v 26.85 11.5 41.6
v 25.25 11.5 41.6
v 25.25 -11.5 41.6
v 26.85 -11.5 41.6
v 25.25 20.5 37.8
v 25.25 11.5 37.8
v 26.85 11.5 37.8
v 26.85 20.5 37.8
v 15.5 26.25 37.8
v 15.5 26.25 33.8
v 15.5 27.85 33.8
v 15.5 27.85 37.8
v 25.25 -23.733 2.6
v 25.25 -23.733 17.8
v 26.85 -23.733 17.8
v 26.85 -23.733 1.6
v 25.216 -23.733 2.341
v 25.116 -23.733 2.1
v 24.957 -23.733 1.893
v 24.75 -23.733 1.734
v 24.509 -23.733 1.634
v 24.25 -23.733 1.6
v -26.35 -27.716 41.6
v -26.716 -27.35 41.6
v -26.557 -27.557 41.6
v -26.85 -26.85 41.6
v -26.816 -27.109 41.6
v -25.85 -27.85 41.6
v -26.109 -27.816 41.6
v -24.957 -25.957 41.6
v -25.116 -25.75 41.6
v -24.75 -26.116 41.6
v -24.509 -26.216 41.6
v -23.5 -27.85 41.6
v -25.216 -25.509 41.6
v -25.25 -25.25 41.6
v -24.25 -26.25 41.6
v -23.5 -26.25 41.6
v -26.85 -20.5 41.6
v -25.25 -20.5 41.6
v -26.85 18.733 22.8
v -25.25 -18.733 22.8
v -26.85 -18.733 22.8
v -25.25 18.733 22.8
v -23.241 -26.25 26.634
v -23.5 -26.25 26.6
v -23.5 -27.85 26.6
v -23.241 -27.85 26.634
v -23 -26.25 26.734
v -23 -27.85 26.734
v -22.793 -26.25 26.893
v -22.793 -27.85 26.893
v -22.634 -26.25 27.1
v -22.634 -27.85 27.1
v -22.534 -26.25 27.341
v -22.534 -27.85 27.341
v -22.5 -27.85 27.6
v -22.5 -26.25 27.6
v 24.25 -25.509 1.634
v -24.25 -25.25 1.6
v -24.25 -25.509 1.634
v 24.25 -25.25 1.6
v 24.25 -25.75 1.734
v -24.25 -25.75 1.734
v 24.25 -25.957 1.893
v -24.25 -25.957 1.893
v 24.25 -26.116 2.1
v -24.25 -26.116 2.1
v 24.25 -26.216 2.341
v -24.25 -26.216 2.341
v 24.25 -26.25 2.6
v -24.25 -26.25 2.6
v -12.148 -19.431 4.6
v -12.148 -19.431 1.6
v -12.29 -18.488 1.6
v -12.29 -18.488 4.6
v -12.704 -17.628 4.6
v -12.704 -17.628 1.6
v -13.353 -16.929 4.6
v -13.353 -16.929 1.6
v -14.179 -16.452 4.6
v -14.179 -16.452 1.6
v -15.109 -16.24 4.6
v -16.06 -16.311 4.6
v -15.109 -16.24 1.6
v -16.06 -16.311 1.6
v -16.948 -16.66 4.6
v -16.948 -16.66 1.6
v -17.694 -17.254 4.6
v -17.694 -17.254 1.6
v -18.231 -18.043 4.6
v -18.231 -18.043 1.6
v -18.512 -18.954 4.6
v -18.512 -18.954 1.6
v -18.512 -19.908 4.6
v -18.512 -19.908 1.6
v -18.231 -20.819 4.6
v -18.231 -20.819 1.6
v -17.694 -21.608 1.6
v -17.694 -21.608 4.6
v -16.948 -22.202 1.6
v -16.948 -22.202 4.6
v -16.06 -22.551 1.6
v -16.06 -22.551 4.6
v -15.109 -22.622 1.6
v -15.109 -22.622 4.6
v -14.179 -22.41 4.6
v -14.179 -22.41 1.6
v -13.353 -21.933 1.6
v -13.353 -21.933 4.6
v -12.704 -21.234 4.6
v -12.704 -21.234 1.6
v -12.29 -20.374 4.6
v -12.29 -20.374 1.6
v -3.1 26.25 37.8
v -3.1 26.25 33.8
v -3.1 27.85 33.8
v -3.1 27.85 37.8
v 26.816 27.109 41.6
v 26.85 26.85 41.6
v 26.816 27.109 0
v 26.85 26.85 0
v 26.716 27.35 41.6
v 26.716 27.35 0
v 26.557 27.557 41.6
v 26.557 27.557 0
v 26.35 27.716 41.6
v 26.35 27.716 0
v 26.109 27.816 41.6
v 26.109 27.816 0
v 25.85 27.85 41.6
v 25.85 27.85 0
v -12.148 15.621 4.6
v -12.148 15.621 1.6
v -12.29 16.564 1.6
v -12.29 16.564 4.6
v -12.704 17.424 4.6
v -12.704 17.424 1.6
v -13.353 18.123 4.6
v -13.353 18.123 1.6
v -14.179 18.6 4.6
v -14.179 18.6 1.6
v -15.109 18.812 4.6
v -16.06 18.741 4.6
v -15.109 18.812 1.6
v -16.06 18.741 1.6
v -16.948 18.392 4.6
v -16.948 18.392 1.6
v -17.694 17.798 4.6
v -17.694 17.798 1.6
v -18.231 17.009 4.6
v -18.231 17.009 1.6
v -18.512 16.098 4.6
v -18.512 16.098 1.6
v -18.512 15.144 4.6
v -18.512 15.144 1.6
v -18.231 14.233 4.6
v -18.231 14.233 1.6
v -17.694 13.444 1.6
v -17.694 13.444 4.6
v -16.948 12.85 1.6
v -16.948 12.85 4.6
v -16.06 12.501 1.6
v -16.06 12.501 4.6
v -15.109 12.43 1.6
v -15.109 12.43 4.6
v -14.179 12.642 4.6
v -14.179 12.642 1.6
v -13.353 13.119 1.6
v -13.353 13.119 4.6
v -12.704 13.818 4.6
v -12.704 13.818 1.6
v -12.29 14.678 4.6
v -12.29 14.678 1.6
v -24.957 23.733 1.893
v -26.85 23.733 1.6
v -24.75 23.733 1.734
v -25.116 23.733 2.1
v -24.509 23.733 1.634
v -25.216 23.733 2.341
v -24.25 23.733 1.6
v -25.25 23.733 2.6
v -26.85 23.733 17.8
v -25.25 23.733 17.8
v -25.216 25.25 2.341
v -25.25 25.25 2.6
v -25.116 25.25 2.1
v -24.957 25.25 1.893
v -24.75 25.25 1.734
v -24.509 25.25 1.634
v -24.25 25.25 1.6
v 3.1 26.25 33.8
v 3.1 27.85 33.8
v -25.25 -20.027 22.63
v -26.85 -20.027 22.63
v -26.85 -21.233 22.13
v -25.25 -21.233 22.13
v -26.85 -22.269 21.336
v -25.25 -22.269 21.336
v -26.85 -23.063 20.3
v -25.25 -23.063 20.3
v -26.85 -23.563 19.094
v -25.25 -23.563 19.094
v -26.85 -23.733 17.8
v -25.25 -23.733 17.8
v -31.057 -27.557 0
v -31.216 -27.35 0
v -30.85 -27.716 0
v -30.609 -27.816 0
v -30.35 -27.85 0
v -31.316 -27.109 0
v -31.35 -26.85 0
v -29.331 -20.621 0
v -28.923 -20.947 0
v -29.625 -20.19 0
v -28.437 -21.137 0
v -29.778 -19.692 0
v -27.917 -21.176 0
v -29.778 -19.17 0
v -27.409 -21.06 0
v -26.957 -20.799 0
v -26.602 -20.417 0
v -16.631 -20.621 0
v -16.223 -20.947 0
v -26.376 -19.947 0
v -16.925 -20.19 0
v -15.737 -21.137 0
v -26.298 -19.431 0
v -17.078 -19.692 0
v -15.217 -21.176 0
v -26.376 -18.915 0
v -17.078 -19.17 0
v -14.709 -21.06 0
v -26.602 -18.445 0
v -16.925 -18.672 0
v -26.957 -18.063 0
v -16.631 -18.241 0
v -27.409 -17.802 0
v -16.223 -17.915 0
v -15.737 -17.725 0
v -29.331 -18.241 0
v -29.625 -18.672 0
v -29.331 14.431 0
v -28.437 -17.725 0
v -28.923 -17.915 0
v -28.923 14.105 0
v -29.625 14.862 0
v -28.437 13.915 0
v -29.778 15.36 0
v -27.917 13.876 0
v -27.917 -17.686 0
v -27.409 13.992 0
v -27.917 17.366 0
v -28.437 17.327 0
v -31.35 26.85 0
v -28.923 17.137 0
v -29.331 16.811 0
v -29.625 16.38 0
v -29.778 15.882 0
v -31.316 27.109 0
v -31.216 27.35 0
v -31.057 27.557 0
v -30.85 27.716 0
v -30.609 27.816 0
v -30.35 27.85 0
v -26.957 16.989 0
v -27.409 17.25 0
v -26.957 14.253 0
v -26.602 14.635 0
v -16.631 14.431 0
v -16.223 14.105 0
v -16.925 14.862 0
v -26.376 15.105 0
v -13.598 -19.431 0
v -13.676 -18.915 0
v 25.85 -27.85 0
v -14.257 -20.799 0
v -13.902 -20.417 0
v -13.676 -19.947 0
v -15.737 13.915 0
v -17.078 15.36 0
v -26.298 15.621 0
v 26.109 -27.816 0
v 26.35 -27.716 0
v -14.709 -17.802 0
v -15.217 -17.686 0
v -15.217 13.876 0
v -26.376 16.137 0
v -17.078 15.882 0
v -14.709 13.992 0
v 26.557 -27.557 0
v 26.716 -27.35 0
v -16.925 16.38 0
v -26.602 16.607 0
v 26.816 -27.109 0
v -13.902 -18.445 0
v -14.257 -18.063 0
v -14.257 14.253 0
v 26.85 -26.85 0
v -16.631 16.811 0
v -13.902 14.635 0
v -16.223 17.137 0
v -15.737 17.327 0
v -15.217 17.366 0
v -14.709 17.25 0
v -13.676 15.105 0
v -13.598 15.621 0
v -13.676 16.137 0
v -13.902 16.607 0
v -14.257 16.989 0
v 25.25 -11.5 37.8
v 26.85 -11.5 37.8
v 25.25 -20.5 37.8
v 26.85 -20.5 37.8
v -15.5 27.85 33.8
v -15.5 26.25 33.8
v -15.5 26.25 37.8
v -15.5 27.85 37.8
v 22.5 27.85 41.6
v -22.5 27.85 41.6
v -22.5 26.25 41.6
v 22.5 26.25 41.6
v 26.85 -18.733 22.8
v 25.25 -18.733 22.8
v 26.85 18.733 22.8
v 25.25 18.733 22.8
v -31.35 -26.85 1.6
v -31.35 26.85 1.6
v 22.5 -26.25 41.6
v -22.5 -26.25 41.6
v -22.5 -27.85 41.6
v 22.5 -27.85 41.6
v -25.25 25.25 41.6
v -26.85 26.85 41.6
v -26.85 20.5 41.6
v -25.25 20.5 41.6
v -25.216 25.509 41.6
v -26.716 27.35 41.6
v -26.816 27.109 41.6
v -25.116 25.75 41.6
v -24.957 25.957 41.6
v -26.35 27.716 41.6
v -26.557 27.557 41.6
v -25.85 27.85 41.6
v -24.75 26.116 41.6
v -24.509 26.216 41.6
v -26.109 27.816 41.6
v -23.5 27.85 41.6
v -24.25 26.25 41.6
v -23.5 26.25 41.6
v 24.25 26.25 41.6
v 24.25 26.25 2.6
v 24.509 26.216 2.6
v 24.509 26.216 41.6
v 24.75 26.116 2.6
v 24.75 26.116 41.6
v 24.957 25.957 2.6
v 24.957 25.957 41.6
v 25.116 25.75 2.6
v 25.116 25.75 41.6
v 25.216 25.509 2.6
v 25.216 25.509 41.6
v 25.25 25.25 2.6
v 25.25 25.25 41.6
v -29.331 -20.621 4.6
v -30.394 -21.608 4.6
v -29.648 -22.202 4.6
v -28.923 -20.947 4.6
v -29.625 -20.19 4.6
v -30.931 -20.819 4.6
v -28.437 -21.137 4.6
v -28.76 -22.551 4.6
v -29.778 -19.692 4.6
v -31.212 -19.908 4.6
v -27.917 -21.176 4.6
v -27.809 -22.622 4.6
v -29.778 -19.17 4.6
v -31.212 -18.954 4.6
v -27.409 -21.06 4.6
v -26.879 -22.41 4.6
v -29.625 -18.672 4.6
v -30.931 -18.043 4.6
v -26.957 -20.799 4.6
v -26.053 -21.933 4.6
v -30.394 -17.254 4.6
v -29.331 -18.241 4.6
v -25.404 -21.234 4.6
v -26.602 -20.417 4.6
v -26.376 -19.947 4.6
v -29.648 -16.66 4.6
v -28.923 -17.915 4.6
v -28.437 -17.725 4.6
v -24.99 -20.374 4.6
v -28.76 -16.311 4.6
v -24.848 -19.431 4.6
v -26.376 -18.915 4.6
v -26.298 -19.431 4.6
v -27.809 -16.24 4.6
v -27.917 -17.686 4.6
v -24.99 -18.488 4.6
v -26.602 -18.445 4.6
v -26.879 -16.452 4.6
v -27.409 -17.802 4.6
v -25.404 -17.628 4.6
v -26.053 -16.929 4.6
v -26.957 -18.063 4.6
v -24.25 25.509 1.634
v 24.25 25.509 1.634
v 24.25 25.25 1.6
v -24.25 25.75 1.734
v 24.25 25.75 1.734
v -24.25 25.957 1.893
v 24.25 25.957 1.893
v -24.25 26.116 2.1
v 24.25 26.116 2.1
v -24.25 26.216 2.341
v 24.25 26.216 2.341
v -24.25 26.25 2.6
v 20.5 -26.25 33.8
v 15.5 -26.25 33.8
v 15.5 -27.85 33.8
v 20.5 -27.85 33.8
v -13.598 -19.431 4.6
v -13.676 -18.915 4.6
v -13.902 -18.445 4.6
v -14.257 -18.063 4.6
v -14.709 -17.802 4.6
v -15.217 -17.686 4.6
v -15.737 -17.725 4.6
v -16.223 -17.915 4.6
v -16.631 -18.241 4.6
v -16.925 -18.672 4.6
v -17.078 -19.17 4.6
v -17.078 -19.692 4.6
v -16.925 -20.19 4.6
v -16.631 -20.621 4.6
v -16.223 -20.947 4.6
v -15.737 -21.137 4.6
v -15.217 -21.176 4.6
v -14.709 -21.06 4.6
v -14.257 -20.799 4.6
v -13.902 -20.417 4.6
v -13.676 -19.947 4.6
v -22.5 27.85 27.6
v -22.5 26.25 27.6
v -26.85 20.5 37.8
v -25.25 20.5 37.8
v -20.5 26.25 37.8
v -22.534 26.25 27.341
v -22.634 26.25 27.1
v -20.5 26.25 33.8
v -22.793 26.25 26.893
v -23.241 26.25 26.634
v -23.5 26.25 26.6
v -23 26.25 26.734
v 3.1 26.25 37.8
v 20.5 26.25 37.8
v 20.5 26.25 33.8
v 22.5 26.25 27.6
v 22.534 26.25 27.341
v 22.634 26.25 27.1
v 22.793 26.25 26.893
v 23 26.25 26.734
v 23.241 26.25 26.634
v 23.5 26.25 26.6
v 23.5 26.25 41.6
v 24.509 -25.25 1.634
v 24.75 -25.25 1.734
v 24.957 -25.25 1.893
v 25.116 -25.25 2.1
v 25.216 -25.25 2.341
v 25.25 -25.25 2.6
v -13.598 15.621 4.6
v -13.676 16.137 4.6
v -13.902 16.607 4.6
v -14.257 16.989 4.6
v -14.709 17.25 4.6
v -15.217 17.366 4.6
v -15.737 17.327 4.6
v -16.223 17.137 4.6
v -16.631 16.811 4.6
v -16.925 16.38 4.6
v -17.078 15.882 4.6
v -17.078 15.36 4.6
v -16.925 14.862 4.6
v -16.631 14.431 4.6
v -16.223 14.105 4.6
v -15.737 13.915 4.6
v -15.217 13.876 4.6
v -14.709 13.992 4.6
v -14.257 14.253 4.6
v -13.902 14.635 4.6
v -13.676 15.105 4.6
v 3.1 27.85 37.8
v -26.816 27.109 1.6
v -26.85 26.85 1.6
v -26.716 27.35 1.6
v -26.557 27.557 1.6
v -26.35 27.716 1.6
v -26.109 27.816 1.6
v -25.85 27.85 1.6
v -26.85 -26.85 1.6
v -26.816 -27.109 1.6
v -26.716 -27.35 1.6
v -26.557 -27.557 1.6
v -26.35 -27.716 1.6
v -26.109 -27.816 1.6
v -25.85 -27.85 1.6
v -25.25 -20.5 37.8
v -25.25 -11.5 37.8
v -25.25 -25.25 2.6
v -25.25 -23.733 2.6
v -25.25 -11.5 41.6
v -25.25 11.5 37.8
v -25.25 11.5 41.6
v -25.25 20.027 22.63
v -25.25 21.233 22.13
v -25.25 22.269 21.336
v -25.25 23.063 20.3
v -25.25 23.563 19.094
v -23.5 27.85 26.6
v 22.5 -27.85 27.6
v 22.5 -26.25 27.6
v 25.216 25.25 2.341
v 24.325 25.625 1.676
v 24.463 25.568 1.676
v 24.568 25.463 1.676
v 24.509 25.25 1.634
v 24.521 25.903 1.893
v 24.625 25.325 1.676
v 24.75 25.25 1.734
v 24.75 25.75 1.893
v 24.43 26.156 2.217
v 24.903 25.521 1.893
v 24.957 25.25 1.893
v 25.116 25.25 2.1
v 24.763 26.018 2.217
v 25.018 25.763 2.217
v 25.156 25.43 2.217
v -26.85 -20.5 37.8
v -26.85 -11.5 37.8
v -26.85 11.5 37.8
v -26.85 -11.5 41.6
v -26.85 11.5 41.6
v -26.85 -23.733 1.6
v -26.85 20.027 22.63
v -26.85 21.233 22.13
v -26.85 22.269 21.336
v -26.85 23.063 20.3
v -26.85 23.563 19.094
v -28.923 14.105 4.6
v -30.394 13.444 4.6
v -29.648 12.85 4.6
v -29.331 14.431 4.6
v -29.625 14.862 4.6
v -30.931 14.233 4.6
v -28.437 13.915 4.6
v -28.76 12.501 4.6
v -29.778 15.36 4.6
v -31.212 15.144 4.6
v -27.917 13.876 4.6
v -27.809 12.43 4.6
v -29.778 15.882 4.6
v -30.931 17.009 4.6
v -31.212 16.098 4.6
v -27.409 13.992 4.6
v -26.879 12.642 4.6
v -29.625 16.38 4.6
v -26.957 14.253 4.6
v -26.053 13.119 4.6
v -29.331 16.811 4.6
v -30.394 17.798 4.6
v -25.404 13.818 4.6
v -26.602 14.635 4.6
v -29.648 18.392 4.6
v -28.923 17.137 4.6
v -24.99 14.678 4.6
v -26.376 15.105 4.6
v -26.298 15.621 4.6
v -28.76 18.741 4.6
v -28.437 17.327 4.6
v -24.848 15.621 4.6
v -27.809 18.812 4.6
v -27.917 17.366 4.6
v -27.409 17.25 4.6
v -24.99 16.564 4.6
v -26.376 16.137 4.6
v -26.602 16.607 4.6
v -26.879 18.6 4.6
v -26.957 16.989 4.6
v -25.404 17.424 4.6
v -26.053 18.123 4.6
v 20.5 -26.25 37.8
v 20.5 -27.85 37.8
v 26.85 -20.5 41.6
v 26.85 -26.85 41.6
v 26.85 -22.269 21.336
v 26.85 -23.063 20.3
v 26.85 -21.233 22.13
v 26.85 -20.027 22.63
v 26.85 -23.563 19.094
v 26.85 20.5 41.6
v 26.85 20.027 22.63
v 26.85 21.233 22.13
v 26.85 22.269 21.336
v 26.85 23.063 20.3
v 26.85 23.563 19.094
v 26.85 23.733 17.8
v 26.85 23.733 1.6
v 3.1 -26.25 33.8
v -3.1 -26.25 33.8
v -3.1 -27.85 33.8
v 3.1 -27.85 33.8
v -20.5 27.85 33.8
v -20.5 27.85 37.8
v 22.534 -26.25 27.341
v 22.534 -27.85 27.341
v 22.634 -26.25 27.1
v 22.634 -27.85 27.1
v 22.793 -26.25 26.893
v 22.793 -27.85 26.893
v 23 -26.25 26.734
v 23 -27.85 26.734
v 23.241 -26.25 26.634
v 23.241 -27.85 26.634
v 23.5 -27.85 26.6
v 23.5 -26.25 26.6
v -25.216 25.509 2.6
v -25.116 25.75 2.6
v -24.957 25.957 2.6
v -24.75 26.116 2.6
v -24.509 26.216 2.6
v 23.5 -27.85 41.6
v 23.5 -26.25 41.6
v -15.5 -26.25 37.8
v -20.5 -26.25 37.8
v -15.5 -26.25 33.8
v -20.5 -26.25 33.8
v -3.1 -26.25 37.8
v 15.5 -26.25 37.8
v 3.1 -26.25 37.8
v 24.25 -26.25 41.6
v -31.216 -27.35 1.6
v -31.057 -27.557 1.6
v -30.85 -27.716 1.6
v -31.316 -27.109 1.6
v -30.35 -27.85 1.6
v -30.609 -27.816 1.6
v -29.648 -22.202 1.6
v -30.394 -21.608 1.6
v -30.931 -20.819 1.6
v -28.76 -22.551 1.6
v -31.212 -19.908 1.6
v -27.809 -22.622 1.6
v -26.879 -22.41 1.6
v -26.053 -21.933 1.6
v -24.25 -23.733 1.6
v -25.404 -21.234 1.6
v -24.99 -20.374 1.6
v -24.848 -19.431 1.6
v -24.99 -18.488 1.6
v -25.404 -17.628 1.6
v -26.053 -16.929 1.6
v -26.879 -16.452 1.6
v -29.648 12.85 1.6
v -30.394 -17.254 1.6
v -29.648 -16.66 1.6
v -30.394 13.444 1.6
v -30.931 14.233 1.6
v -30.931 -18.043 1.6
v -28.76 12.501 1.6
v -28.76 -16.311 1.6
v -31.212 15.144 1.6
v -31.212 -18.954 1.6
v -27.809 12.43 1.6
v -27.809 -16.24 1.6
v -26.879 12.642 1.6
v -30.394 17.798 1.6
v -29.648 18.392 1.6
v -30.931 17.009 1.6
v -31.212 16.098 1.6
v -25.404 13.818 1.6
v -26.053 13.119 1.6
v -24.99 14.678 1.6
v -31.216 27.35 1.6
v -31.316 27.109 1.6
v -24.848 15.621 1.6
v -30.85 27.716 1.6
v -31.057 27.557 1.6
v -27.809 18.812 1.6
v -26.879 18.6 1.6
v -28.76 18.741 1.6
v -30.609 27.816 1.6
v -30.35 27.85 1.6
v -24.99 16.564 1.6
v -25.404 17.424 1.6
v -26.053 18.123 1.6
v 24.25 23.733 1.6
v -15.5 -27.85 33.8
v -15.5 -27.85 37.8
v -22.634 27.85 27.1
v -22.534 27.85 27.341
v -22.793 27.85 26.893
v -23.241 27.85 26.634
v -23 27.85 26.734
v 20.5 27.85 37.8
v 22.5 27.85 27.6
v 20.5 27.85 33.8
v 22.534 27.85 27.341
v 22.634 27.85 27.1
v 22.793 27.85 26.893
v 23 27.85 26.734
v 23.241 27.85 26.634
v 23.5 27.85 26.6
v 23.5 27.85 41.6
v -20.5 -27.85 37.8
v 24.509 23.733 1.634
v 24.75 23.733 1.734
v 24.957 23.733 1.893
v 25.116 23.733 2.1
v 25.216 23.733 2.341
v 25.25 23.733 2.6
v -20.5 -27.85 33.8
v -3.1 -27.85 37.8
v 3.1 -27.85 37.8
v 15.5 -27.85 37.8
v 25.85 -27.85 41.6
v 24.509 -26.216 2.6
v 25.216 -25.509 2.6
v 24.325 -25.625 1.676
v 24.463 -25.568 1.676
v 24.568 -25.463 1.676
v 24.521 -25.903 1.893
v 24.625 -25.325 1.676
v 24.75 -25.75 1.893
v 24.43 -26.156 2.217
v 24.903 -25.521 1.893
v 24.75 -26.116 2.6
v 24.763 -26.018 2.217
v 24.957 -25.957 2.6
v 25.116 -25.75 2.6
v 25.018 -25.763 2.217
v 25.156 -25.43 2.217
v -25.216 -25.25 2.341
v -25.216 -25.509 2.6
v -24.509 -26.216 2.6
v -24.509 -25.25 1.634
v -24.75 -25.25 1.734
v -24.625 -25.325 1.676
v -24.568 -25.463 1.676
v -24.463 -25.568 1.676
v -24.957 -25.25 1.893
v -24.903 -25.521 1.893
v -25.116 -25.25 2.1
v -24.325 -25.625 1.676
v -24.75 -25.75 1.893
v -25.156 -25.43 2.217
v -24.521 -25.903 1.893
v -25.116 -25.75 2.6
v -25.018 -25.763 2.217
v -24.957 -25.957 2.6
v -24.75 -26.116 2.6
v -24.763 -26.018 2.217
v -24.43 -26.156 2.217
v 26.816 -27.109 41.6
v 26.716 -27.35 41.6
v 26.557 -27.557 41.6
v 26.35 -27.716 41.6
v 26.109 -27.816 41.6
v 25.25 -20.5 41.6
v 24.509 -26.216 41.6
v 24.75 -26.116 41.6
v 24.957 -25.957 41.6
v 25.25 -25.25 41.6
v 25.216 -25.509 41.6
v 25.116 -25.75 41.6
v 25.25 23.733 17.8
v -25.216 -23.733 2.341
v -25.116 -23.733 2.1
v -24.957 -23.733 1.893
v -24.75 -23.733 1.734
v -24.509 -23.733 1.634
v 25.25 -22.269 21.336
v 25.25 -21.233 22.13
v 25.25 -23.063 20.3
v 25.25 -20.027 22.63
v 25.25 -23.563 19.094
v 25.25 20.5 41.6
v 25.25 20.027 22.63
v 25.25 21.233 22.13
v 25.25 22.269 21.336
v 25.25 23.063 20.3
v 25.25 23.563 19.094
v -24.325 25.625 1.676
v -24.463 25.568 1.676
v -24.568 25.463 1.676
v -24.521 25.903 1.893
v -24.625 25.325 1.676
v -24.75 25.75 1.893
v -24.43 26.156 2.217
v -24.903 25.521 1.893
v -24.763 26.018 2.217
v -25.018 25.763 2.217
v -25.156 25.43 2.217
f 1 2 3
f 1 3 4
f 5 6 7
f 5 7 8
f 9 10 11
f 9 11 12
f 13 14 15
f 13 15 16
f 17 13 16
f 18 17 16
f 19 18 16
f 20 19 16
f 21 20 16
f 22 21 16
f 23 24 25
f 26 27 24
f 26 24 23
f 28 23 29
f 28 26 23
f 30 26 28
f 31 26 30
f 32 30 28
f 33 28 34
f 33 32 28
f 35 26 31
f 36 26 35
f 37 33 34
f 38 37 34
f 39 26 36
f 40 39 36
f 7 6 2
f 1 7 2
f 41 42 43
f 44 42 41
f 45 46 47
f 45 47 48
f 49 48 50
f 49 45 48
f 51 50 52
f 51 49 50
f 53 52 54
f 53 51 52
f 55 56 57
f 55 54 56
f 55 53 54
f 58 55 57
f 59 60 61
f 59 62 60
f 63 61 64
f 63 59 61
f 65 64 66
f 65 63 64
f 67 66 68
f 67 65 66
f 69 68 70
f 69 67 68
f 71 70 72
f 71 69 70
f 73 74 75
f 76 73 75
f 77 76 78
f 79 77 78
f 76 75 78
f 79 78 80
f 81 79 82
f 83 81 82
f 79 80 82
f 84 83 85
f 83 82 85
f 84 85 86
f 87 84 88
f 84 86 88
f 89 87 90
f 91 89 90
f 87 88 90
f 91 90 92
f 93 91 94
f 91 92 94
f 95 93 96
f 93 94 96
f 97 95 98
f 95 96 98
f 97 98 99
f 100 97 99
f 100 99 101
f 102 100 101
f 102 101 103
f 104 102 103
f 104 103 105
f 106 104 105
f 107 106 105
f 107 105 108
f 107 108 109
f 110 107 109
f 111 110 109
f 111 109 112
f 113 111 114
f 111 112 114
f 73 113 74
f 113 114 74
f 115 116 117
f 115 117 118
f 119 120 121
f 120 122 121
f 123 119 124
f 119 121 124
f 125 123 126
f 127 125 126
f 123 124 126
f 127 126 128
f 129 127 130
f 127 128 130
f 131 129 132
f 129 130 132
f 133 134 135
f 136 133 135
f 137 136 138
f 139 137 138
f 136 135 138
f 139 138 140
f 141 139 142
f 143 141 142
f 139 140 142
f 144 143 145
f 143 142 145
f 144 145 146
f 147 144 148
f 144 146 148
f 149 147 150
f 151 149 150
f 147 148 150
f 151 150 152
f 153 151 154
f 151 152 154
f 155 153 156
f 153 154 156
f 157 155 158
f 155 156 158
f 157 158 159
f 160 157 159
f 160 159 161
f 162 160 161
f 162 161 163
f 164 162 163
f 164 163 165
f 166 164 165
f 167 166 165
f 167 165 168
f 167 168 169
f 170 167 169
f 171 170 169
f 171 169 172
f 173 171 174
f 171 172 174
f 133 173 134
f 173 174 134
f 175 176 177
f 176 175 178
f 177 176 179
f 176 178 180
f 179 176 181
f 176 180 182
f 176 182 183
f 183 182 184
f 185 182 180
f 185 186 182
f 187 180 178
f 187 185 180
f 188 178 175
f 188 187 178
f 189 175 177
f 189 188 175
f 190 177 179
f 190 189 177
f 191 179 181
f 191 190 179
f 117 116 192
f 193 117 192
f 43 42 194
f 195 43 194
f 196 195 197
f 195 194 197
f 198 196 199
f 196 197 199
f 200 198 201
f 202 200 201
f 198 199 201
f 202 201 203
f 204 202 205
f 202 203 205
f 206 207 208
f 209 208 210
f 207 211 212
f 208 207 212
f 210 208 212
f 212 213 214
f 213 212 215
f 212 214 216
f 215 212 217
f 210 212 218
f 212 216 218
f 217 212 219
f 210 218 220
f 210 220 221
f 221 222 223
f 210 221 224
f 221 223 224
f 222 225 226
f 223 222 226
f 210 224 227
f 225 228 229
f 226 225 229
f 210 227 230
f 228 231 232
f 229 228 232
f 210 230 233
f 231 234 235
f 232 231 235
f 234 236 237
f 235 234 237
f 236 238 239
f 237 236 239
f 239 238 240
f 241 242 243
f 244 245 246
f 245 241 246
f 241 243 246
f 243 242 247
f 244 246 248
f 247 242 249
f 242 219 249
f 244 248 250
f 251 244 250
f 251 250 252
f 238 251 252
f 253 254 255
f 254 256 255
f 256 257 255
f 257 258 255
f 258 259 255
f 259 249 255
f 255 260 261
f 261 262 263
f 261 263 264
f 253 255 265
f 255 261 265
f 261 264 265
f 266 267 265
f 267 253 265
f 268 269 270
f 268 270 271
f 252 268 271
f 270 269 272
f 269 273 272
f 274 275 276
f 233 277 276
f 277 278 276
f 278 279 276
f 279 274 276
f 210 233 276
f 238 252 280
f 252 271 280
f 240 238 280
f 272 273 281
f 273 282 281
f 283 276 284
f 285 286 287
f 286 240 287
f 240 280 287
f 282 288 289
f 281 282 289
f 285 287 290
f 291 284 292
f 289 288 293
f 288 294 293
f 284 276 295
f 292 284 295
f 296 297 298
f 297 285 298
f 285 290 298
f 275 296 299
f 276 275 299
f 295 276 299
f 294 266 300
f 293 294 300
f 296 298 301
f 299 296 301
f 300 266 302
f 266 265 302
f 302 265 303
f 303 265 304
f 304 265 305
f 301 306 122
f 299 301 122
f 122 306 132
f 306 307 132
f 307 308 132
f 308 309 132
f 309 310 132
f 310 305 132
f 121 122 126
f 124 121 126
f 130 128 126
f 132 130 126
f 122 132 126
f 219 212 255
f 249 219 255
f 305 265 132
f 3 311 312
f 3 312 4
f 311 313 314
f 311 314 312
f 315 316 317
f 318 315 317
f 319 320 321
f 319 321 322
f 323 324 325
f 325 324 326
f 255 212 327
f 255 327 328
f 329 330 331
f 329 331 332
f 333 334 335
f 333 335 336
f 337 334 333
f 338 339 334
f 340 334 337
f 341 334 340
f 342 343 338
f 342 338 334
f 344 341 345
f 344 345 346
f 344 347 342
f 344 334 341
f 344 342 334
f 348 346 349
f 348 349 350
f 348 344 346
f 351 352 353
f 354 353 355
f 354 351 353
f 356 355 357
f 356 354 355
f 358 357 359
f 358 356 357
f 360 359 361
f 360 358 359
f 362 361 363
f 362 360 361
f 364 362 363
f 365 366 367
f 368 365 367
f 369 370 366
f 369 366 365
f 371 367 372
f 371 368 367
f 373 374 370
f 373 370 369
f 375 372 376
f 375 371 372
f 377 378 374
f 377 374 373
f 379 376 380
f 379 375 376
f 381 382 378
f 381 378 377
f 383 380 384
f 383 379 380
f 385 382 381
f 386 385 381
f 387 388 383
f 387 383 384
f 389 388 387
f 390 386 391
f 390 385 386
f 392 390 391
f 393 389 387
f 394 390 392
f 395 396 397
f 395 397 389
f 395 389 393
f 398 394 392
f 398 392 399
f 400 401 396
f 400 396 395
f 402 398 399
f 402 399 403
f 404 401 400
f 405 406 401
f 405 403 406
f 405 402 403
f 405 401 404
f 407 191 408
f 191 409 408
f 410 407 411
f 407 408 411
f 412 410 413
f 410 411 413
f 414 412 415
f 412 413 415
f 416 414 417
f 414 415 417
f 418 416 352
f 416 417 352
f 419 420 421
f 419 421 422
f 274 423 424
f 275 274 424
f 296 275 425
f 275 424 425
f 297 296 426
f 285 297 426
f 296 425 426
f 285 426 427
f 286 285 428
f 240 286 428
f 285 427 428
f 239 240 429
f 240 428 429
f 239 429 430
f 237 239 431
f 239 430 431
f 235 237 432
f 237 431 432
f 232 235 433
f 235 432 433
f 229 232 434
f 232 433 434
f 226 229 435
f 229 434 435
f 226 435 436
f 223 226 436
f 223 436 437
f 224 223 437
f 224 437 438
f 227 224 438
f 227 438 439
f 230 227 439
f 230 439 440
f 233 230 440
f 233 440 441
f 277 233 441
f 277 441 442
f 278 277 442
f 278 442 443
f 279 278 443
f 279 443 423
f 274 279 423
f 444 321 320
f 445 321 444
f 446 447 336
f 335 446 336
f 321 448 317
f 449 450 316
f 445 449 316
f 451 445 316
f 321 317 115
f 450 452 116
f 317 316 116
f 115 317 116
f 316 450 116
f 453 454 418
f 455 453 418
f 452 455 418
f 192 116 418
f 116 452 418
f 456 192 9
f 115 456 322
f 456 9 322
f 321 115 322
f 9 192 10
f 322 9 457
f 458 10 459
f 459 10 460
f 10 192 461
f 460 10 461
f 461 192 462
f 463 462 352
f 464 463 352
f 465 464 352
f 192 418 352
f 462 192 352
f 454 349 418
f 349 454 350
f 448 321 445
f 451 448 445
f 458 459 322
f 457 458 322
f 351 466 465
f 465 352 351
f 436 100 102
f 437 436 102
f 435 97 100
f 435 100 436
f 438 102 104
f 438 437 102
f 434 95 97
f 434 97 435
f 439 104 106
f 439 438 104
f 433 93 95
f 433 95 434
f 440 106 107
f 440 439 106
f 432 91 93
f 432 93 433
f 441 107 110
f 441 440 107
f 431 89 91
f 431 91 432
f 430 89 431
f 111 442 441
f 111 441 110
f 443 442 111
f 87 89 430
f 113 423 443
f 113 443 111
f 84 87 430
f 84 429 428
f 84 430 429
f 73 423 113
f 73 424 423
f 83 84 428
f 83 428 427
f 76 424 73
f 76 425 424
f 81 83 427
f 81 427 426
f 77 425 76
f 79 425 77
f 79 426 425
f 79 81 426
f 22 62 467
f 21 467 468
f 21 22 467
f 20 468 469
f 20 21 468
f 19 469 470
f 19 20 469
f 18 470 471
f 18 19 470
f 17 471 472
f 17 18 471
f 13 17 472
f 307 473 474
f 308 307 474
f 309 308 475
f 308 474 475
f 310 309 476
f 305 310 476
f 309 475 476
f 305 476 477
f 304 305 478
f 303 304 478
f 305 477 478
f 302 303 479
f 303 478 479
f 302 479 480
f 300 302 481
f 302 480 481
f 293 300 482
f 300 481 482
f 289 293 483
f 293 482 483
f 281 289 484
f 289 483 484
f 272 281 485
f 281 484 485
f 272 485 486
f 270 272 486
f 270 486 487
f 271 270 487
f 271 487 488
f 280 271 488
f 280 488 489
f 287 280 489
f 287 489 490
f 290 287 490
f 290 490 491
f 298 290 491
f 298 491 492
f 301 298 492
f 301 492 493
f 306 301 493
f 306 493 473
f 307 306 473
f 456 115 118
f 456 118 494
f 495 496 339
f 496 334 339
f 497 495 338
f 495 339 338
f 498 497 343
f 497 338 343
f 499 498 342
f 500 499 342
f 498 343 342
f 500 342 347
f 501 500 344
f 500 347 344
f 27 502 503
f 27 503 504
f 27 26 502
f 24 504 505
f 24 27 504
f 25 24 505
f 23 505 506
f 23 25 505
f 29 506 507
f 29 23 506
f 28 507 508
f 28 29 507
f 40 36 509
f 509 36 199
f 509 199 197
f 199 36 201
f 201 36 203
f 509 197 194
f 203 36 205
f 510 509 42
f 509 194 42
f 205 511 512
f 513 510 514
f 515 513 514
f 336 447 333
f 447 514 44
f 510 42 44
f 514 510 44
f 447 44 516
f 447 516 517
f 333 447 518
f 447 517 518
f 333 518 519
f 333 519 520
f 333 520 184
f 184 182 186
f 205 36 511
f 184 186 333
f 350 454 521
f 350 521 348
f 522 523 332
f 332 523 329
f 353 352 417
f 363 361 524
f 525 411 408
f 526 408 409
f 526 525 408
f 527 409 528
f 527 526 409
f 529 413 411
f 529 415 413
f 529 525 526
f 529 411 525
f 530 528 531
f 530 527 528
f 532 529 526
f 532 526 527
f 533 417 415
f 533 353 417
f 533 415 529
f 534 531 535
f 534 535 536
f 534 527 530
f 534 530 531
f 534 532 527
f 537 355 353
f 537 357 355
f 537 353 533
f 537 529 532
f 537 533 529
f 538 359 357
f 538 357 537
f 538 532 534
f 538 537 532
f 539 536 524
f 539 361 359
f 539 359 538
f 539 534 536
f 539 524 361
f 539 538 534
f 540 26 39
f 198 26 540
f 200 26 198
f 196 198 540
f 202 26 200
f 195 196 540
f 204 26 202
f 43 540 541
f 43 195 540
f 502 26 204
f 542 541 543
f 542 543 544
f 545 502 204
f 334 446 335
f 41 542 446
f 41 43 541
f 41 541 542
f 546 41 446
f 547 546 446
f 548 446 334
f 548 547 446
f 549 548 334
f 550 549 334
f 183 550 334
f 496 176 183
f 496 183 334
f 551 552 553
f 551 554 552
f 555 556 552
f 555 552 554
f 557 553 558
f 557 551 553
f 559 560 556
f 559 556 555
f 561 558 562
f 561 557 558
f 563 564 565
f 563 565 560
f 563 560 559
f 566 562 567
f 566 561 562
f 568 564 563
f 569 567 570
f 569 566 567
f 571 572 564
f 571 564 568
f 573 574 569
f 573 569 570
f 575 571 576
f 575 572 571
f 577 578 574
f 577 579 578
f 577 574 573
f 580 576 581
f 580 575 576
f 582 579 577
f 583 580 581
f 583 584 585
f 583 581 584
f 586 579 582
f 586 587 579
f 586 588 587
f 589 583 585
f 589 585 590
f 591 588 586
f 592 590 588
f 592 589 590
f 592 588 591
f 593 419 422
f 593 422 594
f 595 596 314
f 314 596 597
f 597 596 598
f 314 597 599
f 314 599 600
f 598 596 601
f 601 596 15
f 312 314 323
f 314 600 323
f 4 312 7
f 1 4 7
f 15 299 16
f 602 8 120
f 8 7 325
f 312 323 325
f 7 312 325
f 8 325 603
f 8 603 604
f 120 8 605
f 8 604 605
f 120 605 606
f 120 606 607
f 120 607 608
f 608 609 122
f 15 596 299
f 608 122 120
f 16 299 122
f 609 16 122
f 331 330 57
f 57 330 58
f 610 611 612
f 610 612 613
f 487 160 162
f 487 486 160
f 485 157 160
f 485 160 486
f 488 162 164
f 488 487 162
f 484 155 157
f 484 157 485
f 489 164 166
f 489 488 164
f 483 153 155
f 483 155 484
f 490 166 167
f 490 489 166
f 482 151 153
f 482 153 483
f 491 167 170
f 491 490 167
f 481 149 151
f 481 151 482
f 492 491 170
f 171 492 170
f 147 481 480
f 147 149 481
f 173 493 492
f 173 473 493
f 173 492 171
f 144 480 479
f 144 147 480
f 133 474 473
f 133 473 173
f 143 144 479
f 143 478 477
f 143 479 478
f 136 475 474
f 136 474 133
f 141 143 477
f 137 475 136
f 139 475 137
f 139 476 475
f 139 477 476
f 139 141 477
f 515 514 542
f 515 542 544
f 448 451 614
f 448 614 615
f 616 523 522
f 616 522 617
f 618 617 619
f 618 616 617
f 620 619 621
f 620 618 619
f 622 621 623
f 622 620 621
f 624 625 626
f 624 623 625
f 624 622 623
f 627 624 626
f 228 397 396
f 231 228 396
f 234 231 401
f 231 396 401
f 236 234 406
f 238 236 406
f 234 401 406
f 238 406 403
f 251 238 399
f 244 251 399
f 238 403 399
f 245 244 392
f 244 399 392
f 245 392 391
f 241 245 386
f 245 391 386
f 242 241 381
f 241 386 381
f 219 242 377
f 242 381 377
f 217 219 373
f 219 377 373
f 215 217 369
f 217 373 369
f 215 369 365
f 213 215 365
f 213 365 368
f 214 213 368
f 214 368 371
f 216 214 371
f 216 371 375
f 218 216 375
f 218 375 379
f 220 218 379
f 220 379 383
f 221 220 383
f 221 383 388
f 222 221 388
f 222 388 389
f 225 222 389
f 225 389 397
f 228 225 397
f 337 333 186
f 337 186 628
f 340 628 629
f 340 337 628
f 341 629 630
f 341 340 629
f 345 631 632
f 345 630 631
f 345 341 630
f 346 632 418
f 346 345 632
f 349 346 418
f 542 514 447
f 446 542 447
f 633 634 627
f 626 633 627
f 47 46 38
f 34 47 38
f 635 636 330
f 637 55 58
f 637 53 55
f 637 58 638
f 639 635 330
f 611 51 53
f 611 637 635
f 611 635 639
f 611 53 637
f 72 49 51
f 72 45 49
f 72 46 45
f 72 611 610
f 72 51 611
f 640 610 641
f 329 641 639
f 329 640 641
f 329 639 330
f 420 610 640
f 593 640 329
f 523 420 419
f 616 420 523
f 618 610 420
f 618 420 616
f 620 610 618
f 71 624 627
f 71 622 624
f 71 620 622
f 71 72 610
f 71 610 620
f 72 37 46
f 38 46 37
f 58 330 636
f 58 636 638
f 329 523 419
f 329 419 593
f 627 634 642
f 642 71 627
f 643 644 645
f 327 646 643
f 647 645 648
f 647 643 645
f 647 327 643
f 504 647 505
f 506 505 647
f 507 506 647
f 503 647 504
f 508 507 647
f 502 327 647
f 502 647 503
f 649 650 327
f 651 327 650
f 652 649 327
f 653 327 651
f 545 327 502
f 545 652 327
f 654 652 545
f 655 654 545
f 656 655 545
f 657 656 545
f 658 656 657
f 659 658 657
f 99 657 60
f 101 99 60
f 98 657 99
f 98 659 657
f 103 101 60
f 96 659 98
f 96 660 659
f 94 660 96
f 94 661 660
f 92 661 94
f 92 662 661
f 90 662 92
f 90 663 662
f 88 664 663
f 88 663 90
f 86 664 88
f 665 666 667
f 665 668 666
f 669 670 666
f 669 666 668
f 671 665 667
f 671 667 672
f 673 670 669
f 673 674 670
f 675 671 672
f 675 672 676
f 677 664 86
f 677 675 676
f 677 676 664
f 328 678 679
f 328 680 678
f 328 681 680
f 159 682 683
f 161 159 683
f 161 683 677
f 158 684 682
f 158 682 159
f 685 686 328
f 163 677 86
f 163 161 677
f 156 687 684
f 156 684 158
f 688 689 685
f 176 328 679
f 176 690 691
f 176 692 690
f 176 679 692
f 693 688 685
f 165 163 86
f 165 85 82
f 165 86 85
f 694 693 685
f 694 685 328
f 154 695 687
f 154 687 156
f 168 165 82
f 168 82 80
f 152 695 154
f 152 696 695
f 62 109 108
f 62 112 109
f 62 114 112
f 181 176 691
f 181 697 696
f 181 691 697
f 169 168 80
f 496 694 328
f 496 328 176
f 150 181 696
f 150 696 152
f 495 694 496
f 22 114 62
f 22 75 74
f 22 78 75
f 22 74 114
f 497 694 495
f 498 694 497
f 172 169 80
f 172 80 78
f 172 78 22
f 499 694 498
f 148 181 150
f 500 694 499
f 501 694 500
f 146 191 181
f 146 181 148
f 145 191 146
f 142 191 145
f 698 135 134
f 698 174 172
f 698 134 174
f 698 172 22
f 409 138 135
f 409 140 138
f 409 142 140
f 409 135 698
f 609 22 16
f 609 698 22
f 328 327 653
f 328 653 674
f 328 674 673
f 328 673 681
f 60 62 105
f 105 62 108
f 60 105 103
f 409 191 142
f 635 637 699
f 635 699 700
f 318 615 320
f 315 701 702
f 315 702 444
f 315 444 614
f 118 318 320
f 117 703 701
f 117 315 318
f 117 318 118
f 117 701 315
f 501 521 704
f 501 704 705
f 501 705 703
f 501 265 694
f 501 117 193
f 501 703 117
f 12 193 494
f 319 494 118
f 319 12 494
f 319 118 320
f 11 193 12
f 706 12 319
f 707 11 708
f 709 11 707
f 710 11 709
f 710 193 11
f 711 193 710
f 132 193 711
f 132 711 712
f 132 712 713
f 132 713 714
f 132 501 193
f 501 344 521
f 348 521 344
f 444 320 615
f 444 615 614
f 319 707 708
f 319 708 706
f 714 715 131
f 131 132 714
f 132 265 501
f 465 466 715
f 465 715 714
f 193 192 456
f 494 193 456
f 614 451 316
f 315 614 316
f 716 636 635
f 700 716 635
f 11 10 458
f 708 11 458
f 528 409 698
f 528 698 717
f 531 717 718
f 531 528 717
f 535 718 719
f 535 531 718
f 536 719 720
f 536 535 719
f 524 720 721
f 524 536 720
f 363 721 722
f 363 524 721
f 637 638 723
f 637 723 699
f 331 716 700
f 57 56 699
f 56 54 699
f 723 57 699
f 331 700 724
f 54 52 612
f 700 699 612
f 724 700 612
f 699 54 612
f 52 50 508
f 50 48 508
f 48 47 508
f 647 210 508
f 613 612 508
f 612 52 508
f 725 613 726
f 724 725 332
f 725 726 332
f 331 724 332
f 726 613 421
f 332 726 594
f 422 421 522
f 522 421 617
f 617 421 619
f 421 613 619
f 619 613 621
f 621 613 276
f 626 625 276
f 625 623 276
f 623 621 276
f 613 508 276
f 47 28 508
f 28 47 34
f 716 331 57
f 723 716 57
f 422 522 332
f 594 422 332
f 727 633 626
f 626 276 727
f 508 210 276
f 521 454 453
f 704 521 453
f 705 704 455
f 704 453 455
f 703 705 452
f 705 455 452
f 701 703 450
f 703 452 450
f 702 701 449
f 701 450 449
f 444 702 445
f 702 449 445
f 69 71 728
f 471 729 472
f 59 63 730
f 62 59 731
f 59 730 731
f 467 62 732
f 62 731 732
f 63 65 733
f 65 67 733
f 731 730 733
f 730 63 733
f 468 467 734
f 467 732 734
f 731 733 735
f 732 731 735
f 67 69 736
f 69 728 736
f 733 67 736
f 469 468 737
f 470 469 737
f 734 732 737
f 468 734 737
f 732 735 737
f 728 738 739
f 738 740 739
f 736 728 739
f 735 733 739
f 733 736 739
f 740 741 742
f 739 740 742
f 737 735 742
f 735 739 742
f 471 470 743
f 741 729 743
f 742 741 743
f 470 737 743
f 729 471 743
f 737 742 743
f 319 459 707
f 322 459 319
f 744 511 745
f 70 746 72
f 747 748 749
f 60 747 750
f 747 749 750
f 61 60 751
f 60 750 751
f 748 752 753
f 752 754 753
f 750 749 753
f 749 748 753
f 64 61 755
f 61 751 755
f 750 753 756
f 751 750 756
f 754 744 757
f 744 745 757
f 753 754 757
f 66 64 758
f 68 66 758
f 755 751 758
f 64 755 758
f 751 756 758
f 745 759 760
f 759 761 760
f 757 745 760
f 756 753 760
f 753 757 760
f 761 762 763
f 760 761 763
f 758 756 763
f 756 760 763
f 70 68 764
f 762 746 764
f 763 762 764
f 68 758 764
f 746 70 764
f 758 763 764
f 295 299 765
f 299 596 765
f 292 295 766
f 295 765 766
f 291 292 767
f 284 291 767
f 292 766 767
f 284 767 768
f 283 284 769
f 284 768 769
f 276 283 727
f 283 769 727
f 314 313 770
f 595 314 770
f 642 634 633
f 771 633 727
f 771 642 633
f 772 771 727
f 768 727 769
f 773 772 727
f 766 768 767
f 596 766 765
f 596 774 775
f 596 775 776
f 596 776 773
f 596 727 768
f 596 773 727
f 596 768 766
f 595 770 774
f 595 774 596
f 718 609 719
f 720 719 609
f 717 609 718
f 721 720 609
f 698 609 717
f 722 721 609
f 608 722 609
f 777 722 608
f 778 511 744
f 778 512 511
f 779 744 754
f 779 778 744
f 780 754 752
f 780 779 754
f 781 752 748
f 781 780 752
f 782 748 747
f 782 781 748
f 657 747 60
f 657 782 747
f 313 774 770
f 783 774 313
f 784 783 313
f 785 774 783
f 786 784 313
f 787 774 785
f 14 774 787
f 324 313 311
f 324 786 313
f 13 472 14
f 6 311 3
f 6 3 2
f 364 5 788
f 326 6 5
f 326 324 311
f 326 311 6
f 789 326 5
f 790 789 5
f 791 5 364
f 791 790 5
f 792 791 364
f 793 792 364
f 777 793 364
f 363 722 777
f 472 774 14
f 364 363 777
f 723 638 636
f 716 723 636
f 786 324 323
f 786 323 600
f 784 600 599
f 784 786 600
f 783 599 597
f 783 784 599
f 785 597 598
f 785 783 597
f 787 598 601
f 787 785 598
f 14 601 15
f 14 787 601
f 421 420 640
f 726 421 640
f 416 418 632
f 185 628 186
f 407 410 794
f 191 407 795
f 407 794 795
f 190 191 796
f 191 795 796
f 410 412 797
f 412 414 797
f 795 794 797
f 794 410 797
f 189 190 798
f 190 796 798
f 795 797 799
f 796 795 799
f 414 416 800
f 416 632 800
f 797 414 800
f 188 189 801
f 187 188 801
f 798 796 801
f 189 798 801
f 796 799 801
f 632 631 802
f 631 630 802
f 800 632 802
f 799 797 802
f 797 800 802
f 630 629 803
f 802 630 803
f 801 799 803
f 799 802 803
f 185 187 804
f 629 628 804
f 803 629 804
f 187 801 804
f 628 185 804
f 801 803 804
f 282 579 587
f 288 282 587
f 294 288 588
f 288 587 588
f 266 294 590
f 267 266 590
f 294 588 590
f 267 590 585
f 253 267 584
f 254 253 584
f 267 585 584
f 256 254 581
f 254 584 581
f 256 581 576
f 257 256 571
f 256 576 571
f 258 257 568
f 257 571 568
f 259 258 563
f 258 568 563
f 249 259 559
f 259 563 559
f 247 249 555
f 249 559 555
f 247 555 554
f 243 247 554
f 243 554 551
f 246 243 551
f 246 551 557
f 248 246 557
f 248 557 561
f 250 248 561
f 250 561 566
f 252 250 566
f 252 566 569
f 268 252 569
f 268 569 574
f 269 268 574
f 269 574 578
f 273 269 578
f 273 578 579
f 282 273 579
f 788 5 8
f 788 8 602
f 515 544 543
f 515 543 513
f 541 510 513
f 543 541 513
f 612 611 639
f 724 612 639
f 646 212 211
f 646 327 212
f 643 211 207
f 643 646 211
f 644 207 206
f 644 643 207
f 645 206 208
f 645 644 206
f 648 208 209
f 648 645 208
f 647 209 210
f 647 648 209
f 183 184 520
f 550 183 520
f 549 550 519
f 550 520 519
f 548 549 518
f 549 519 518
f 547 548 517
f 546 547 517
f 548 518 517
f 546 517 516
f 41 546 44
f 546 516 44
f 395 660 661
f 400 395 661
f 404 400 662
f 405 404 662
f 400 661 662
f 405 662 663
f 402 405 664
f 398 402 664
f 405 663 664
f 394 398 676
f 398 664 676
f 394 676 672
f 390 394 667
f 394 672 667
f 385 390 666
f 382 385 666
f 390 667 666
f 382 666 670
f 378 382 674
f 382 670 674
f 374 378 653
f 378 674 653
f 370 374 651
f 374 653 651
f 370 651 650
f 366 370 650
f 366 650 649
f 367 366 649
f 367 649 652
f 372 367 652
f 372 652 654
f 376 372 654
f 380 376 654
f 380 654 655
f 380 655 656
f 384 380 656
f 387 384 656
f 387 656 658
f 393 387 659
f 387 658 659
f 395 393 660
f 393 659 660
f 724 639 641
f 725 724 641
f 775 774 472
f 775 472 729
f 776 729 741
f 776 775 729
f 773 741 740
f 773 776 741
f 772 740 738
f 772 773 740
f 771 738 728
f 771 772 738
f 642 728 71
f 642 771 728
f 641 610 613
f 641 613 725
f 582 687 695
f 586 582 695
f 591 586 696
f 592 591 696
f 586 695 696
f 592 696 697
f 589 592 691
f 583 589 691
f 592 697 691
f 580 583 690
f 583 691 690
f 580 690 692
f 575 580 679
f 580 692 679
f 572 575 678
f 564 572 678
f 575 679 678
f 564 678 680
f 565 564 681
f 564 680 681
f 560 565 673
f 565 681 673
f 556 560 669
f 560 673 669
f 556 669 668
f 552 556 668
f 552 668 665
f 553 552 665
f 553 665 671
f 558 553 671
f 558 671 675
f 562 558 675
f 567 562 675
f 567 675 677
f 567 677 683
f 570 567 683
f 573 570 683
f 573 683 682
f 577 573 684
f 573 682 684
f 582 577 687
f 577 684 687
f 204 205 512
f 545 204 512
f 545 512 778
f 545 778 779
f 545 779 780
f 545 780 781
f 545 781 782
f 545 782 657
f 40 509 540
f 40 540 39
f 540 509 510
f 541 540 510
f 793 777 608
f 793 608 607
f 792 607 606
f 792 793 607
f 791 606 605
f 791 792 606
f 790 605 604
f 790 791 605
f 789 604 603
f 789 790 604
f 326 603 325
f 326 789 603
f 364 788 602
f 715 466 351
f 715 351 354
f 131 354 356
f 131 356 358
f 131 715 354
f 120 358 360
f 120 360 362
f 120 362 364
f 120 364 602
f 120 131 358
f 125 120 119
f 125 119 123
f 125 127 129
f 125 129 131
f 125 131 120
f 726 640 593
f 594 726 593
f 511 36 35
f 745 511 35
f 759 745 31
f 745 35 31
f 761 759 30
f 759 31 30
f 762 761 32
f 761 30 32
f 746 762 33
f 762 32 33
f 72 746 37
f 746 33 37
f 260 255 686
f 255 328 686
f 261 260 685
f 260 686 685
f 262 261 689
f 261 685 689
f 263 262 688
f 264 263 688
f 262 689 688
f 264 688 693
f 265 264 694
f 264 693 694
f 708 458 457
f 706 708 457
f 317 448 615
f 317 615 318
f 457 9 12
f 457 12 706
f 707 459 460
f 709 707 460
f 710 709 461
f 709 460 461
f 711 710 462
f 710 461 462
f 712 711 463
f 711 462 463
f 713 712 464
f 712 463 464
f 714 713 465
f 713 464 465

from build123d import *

# Parameters (mm, degrees)
SKETCH041_W          = 58.2
SKETCH041_H          = 55.7
PAD012_DEPTH         = 1.6
SKETCH046_W          = 53.7
SKETCH046_H          = 55.7
SKETCH046_W_2        = 50.5
SKETCH046_H_2        = 52.5
PAD014_DEPTH         = 40
FILLET005_R          = 1
SKETCH039_W          = 6.2
SKETCH039_H          = 4
SKETCH039_W_2        = 5
POCKET011_DEPTH      = 27.851
POCKET011_DEPTH_BACK = 27.851
SKETCH040_W          = 9
SKETCH040_H          = 3.8
POCKET013_DEPTH      = 31.351
POCKET013_DEPTH_BACK = 26.851
SKETCH042_R          = 3.2
PAD013_DEPTH         = 3
SKETCH045_R          = 1.75
POCKET012_DEPTH      = 4.601


with BuildPart() as part:
    # Sketch041 → Pad012 (new body)
    with BuildSketch(Plane.XY):
        with Locations((-2.25, 0)):
            Rectangle(SKETCH041_W, SKETCH041_H)
    extrude(amount=PAD012_DEPTH)

    # Sketch046 → Pad014 (join)
    with BuildSketch(Plane.XY.offset(1.6)):
        Rectangle(SKETCH046_W, SKETCH046_H)
        Rectangle(SKETCH046_W_2, SKETCH046_H_2, mode=Mode.SUBTRACT)
    extrude(amount=PAD014_DEPTH)

    # Fillet005
    fillet005_edges = [part.edges().sort_by_distance(p)[0] for p in [
        (-31.35, -27.85, 0.8),
        (-31.35, 27.85, 0.8),
        (-26.85, 27.85, 21.6),
        (-26.85, -27.85, 21.6),
        (26.85, -27.85, 20.8),
        (25.25, 26.25, 21.6),
        (-25.25, 26.25, 21.6),
        (26.85, 27.85, 20.8),
        (-25.25, -26.25, 21.6),
        (25.25, -26.25, 21.6),
        (0, 26.25, 1.6),
        (-25.25, 0, 1.6),
        (0, -26.25, 1.6),
        (25.25, 0, 1.6),
    ]]
    fillet(fillet005_edges, radius=FILLET005_R)

    # Sketch039 → Pocket011 (cut, two sides)
    with BuildSketch(Plane.XZ) as pocket011_sk:
        with Locations((0, 35.8)):
            Rectangle(SKETCH039_W, SKETCH039_H)
        with Locations((-18, 35.8)):
            Rectangle(SKETCH039_W_2, SKETCH039_H)
        with Locations((18, 35.8)):
            Rectangle(SKETCH039_W_2, SKETCH039_H)
        with BuildLine():
            Line((22.5, 41.6), (23.5, 41.6))
            Line((23.5, 41.6), (23.5, 26.6))
            ThreePointArc((22.5, 27.6), (22.792893, 26.892893), (23.5, 26.6))
            Line((22.5, 27.6), (22.5, 41.6))
        make_face()
        with BuildLine():
            Line((-23.5, 41.6), (-22.5, 41.6))
            Line((-22.5, 41.6), (-22.5, 27.6))
            ThreePointArc((-23.5, 26.6), (-22.792893, 26.892893), (-22.5, 27.6))
            Line((-23.5, 26.6), (-23.5, 41.6))
        make_face()
    extrude(amount=-POCKET011_DEPTH, mode=Mode.SUBTRACT)
    extrude(pocket011_sk.sketch, amount=POCKET011_DEPTH_BACK, mode=Mode.SUBTRACT)

    # Sketch040 → Pocket013 (cut, two sides)
    with BuildSketch(Plane.YZ) as pocket013_sk:
        with Locations((-16, 39.7)):
            Rectangle(SKETCH040_W, SKETCH040_H)
        with Locations((16, 39.7)):
            Rectangle(SKETCH040_W, SKETCH040_H)
        with BuildLine():
            Line((-18.733, 22.8), (18.733, 22.8))
            ThreePointArc((23.733, 17.8), (22.268534, 21.335534), (18.733, 22.8))
            Line((23.733, 1.6), (23.733, 17.8))
            Line((-23.733, 1.6), (23.733, 1.6))
            Line((-23.733, 17.8), (-23.733, 1.6))
            ThreePointArc((-18.733, 22.8), (-22.268534, 21.335534), (-23.733, 17.8))
        make_face()
    extrude(amount=-POCKET013_DEPTH, mode=Mode.SUBTRACT)
    extrude(pocket013_sk.sketch, amount=POCKET013_DEPTH_BACK, mode=Mode.SUBTRACT)

    # Sketch042 → Pad013 (join)
    with BuildSketch(Plane.XY.offset(1.6)):
        with Locations((-15.348, 15.621)):
            Circle(SKETCH042_R)
        with Locations((-28.048, -19.431)):
            Circle(SKETCH042_R)
        with Locations((-15.348, -19.431)):
            Circle(SKETCH042_R)
        with Locations((-28.048, 15.621)):
            Circle(SKETCH042_R)
    extrude(amount=PAD013_DEPTH)

    # Sketch045 → Pocket012 (cut, through all)
    with BuildSketch(Plane.XY.offset(4.6)):
        with Locations((-28.048, 15.621)):
            Circle(SKETCH045_R)
        with Locations((-15.348, 15.621)):
            Circle(SKETCH045_R)
        with Locations((-15.348, -19.431)):
            Circle(SKETCH045_R)
        with Locations((-28.048, -19.431)):
            Circle(SKETCH045_R)
    extrude(amount=-POCKET012_DEPTH, mode=Mode.SUBTRACT)


solid = part.part
